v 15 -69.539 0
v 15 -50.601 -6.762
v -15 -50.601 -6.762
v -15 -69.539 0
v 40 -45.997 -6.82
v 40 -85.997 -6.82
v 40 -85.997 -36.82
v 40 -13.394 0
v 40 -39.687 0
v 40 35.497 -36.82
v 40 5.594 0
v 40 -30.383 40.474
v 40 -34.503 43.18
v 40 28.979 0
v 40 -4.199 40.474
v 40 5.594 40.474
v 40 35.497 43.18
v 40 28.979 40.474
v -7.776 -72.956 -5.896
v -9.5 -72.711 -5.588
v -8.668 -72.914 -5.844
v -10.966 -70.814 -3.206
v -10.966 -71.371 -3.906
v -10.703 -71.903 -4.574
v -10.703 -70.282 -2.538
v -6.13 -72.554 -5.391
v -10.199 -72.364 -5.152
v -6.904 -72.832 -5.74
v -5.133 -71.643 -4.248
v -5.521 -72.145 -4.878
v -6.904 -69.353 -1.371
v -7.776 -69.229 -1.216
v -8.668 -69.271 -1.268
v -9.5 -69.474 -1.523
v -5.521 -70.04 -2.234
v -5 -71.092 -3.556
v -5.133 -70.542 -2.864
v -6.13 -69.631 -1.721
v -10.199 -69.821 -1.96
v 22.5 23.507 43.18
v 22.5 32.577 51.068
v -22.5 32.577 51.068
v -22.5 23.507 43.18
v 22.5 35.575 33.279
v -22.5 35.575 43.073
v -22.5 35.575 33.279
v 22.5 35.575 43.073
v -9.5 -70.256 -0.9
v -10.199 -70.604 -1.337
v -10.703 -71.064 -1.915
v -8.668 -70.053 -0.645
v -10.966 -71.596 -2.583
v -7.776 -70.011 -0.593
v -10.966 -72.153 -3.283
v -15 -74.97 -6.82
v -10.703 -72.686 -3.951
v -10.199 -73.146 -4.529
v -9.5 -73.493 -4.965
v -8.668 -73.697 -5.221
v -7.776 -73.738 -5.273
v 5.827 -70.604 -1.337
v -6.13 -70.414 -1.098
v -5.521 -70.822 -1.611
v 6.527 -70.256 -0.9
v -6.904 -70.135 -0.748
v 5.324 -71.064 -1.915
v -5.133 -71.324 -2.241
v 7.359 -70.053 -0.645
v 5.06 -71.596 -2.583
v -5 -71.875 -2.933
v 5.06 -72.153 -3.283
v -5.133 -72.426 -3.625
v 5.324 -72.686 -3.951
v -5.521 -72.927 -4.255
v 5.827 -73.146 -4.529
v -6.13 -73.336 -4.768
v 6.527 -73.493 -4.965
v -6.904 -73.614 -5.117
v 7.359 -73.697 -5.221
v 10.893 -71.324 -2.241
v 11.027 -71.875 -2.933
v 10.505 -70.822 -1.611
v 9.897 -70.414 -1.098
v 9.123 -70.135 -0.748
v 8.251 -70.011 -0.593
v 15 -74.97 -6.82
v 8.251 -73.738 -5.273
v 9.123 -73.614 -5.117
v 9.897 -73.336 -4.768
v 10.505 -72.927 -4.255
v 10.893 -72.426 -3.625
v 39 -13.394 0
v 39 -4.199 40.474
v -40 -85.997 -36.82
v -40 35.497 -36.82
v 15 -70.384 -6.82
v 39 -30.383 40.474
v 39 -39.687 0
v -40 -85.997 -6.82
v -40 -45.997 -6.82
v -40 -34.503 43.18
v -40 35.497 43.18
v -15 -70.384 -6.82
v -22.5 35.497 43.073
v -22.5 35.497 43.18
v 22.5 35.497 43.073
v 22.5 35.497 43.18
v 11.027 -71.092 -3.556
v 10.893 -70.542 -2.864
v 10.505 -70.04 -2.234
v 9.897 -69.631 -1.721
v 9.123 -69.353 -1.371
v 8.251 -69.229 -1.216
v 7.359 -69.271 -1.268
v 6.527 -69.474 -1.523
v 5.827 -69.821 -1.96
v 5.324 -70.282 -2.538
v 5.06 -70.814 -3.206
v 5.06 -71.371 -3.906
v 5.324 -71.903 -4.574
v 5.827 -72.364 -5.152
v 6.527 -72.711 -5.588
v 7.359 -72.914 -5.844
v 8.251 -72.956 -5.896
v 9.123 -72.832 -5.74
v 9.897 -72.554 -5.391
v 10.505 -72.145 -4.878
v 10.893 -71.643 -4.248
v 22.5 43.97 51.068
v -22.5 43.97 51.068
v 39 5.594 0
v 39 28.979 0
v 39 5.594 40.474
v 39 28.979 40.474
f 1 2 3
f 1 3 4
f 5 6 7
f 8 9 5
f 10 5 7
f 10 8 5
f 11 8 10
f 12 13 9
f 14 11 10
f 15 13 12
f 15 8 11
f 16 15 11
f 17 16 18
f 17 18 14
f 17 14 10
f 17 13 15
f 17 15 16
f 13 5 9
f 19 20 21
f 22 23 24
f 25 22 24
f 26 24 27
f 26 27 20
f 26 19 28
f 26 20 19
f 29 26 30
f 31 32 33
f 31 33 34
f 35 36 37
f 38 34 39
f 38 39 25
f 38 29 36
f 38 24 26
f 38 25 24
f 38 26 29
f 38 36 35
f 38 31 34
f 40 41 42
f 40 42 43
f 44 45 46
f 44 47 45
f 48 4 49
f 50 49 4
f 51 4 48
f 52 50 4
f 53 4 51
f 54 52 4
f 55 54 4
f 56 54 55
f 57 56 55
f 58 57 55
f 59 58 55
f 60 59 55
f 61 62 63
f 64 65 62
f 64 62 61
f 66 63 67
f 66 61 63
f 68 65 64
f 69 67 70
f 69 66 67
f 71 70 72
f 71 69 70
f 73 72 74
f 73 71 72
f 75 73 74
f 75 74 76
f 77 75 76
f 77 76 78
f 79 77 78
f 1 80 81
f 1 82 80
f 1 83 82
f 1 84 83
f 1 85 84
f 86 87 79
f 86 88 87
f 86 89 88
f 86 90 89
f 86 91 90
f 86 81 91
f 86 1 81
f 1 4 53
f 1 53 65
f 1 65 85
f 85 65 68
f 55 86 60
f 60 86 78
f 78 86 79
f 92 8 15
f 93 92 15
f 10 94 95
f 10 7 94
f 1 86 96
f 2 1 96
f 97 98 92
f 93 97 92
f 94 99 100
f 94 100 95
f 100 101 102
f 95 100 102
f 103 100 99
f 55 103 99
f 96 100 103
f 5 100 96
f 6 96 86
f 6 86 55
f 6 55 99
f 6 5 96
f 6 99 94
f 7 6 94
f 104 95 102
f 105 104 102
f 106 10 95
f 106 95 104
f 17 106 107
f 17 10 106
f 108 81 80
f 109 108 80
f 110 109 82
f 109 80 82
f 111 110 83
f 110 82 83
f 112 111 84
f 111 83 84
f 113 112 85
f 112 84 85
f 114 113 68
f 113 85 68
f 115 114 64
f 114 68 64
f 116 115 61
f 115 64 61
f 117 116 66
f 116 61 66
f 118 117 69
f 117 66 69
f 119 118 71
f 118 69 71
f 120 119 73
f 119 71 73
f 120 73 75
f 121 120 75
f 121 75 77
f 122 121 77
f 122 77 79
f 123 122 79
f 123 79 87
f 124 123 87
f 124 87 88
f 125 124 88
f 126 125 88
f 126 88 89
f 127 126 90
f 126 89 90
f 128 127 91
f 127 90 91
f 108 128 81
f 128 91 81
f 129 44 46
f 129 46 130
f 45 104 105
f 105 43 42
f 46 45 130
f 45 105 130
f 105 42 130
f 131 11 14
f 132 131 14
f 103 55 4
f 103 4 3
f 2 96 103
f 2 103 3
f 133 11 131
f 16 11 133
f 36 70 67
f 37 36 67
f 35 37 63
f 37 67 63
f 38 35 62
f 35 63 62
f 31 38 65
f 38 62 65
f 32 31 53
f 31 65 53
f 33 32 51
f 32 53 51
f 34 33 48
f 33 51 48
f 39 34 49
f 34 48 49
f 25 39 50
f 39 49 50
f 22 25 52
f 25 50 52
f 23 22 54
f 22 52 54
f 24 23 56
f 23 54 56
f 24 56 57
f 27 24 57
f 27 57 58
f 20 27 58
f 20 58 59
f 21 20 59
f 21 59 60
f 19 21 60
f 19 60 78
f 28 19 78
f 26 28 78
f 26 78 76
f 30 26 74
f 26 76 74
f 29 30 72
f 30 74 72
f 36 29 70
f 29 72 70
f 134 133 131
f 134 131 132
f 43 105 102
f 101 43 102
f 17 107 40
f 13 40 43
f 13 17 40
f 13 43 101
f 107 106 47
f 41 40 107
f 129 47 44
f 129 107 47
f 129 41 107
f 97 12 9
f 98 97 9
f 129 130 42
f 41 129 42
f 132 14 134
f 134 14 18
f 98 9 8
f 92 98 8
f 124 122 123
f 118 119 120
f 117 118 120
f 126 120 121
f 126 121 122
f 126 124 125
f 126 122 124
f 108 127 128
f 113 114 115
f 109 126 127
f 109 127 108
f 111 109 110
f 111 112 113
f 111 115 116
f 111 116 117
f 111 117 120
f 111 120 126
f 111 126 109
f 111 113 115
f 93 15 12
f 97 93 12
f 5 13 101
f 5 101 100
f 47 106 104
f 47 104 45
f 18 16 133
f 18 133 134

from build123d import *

# Parameters (mm, degrees)
F1_DEPTH = 40
F3_DEPTH = 22.5
F5_DEPTH = 15
F6_R     = 3
F7_DEPTH = 1
F8_W     = 23.385154
F8_H     = 40.474307
F9_DEPTH = 1


with BuildPart() as f1:
    # F0 (on Right) → F1 (new body, symmetric)
    with BuildSketch(Plane.YZ):
        Polygon((35.49702, 43.180404), (-34.50298, 43.180404), (-45.997234, -6.819596), (-85.997234, -6.819596), (-85.997234, -36.819596), (35.49702, -36.819596), align=None)
    extrude(amount=F1_DEPTH, both=True)

    # F2 (on Right) → F3 (join, symmetric)
    with BuildSketch(Plane.YZ):
        Polygon((35.575308, 43.072656), (35.575308, 33.278871), (43.969978, 51.067576), (32.577209, 51.067576), (23.383051, 43.072656), align=None)
    extrude(amount=F3_DEPTH, both=True)

    # F4 (on Right) → F5 (join, symmetric)
    with BuildSketch(Plane.YZ):
        Polygon((-74.98049, -6.83292), (-50.600782, -6.762254), (-69.539219, 0), align=None)
    extrude(amount=F5_DEPTH, both=True)

    # F6 (on face) → F7 (cut)
    with BuildSketch(Plane(origin=(0, -42.553907, 33.887025), x_dir=(1, 0, 0), z_dir=(0, -0.782267, 0.622944))):
        with Locations((-8, -47.068199)):
            Circle(F6_R)
        with Locations((8.026602, -47.068199)):
            Circle(F6_R)
    extrude(amount=-F7_DEPTH, mode=Mode.SUBTRACT)

    # F8 (on face) → F9 (cut)
    with BuildSketch(Plane.YZ.offset(40)):
        Polygon((-4.19944, 40.474307), (-30.382816, 40.474307), (-39.687255, 0), (-13.393601, 0), align=None)
        with Locations((17.28692, 20.237153)):
            Rectangle(F8_W, F8_H)
    extrude(amount=-F9_DEPTH, mode=Mode.SUBTRACT)


solid = f1.part
